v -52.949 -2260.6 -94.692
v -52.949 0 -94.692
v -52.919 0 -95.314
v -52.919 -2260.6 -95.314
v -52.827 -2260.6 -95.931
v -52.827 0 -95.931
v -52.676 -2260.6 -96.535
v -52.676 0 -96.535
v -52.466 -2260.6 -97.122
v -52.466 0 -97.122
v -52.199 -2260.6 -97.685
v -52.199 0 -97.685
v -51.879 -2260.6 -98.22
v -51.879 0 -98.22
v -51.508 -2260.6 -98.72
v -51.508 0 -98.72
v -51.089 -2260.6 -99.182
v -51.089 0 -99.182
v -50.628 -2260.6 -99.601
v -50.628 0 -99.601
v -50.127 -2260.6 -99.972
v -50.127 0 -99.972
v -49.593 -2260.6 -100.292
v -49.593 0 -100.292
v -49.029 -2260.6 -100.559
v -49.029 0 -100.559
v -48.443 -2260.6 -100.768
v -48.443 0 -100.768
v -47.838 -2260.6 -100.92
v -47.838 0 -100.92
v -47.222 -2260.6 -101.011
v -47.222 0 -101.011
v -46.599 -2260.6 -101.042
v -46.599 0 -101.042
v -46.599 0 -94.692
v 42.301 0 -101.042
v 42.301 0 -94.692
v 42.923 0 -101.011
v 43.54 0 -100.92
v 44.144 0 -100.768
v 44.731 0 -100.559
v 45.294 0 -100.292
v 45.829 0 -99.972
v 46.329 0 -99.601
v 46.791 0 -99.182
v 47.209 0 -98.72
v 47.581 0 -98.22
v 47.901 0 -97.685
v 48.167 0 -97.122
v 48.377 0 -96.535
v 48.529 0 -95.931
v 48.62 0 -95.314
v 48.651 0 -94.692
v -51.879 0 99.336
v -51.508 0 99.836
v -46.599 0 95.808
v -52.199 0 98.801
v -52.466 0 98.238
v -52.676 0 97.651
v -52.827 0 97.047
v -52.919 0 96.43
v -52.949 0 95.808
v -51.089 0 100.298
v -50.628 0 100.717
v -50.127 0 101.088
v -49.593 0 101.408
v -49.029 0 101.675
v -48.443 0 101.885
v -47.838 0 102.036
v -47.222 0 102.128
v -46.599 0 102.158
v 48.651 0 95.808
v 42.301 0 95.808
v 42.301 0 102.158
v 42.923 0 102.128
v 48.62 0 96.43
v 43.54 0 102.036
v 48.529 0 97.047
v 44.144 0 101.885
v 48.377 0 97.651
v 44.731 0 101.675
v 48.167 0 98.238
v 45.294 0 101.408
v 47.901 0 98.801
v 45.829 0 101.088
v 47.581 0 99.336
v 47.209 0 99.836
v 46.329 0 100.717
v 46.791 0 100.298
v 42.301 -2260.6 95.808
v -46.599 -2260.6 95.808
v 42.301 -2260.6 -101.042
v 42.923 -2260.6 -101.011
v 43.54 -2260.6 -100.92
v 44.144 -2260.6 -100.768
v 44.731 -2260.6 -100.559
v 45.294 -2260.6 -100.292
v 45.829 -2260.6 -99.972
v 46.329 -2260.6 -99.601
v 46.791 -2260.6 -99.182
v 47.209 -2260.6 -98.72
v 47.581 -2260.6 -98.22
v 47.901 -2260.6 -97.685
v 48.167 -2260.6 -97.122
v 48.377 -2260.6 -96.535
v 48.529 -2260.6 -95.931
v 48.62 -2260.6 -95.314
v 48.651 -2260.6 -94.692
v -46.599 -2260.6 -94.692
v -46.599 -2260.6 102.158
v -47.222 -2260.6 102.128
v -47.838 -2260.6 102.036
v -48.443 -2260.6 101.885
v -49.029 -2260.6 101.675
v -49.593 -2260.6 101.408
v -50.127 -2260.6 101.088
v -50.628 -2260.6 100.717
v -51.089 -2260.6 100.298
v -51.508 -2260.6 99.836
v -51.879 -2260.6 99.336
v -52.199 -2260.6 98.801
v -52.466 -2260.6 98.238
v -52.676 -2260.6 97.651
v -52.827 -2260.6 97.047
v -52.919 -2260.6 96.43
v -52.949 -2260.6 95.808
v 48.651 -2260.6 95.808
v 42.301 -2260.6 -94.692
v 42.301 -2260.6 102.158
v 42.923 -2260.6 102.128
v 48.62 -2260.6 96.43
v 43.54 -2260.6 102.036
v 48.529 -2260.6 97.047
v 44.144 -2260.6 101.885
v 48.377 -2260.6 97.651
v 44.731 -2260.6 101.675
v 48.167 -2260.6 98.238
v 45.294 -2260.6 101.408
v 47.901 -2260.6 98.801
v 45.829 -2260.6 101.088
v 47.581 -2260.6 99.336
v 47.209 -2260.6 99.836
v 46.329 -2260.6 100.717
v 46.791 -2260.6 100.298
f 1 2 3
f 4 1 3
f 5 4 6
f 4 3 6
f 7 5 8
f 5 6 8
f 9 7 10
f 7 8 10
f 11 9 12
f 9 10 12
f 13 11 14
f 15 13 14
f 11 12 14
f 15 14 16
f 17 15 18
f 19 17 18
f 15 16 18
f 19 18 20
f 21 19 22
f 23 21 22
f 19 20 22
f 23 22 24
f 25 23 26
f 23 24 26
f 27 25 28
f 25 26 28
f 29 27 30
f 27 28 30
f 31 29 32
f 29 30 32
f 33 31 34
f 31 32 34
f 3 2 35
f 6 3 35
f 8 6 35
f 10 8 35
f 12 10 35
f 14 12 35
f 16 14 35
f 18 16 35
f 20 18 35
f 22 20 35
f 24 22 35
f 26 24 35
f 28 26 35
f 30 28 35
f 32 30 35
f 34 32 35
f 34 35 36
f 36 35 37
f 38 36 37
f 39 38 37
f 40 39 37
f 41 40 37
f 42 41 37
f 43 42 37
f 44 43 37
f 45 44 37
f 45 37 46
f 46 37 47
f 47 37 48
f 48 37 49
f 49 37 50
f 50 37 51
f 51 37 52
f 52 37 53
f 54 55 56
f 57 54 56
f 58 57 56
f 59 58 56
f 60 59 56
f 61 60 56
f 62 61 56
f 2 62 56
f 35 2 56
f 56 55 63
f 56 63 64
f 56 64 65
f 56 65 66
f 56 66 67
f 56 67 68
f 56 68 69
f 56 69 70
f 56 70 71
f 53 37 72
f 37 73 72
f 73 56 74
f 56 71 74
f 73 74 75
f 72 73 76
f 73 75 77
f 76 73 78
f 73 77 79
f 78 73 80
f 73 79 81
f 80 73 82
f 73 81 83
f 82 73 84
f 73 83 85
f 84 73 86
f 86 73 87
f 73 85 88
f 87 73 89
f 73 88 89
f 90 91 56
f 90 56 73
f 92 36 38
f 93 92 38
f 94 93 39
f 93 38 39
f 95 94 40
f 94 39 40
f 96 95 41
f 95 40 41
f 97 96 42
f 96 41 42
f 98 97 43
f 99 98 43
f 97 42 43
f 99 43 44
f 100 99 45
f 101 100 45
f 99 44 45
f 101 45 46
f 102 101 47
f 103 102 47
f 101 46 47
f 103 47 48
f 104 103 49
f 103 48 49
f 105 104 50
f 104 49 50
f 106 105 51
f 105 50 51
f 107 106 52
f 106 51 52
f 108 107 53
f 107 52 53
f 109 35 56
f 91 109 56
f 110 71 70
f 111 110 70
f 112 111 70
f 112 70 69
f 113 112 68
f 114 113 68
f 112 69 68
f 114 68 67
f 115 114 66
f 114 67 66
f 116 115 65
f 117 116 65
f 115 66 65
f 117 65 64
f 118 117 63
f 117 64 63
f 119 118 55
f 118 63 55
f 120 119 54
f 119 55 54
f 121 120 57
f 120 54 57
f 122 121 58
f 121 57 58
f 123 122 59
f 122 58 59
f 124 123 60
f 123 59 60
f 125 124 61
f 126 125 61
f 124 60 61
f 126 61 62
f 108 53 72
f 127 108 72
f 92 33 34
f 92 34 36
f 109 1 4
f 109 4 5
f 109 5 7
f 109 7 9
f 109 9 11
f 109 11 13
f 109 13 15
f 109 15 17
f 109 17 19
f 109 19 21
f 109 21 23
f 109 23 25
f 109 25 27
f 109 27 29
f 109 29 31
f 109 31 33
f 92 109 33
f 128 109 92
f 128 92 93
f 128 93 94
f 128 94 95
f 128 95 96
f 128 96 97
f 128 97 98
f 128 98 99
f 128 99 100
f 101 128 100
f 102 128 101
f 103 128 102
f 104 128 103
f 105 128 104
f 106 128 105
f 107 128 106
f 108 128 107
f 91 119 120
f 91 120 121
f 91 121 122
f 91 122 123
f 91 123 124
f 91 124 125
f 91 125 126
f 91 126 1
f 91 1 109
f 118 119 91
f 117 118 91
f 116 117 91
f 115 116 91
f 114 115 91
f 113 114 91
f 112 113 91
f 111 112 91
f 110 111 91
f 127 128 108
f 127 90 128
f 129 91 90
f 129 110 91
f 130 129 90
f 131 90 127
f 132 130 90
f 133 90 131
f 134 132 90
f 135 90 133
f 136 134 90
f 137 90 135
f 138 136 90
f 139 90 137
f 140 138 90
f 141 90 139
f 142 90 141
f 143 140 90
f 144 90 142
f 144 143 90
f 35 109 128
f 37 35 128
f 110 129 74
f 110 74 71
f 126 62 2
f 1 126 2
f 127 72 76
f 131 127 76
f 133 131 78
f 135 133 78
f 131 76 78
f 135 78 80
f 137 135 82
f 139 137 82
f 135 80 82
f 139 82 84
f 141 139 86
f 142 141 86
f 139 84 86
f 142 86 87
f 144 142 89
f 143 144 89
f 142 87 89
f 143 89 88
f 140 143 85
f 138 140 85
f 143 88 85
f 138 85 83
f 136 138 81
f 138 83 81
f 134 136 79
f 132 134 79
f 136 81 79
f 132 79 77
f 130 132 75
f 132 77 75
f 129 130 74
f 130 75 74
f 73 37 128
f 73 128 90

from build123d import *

# Parameters (mm, degrees)
F0_W     = 88.9
F0_H     = 190.5
F1_DEPTH = 2260.6


with BuildPart() as f1:
    # F0 (on Front) → F1 (new body)
    with BuildSketch(Plane.XZ):
        with BuildLine():
            Line((42.300776, 102.158077), (-46.599224, 102.158077))
            ThreePointArc((-46.599224, 102.158077), (-51.089352, 100.298206), (-52.949224, 95.808077))
            Line((-52.949224, 95.808077), (-52.949224, -94.691923))
            ThreePointArc((-52.949224, -94.691923), (-51.089352, -99.182051), (-46.599224, -101.041923))
            Line((-46.599224, -101.041923), (42.300776, -101.041923))
            ThreePointArc((42.300776, -101.041923), (46.790904, -99.182051), (48.650776, -94.691923))
            Line((48.650776, -94.691923), (48.650776, 95.808077))
            ThreePointArc((48.650776, 95.808077), (46.790904, 100.298206), (42.300776, 102.158077))
        make_face()
        with Locations((-2.149224, 0.558077)):
            Rectangle(F0_W, F0_H, mode=Mode.SUBTRACT)
    extrude(amount=F1_DEPTH)


solid = f1.part
